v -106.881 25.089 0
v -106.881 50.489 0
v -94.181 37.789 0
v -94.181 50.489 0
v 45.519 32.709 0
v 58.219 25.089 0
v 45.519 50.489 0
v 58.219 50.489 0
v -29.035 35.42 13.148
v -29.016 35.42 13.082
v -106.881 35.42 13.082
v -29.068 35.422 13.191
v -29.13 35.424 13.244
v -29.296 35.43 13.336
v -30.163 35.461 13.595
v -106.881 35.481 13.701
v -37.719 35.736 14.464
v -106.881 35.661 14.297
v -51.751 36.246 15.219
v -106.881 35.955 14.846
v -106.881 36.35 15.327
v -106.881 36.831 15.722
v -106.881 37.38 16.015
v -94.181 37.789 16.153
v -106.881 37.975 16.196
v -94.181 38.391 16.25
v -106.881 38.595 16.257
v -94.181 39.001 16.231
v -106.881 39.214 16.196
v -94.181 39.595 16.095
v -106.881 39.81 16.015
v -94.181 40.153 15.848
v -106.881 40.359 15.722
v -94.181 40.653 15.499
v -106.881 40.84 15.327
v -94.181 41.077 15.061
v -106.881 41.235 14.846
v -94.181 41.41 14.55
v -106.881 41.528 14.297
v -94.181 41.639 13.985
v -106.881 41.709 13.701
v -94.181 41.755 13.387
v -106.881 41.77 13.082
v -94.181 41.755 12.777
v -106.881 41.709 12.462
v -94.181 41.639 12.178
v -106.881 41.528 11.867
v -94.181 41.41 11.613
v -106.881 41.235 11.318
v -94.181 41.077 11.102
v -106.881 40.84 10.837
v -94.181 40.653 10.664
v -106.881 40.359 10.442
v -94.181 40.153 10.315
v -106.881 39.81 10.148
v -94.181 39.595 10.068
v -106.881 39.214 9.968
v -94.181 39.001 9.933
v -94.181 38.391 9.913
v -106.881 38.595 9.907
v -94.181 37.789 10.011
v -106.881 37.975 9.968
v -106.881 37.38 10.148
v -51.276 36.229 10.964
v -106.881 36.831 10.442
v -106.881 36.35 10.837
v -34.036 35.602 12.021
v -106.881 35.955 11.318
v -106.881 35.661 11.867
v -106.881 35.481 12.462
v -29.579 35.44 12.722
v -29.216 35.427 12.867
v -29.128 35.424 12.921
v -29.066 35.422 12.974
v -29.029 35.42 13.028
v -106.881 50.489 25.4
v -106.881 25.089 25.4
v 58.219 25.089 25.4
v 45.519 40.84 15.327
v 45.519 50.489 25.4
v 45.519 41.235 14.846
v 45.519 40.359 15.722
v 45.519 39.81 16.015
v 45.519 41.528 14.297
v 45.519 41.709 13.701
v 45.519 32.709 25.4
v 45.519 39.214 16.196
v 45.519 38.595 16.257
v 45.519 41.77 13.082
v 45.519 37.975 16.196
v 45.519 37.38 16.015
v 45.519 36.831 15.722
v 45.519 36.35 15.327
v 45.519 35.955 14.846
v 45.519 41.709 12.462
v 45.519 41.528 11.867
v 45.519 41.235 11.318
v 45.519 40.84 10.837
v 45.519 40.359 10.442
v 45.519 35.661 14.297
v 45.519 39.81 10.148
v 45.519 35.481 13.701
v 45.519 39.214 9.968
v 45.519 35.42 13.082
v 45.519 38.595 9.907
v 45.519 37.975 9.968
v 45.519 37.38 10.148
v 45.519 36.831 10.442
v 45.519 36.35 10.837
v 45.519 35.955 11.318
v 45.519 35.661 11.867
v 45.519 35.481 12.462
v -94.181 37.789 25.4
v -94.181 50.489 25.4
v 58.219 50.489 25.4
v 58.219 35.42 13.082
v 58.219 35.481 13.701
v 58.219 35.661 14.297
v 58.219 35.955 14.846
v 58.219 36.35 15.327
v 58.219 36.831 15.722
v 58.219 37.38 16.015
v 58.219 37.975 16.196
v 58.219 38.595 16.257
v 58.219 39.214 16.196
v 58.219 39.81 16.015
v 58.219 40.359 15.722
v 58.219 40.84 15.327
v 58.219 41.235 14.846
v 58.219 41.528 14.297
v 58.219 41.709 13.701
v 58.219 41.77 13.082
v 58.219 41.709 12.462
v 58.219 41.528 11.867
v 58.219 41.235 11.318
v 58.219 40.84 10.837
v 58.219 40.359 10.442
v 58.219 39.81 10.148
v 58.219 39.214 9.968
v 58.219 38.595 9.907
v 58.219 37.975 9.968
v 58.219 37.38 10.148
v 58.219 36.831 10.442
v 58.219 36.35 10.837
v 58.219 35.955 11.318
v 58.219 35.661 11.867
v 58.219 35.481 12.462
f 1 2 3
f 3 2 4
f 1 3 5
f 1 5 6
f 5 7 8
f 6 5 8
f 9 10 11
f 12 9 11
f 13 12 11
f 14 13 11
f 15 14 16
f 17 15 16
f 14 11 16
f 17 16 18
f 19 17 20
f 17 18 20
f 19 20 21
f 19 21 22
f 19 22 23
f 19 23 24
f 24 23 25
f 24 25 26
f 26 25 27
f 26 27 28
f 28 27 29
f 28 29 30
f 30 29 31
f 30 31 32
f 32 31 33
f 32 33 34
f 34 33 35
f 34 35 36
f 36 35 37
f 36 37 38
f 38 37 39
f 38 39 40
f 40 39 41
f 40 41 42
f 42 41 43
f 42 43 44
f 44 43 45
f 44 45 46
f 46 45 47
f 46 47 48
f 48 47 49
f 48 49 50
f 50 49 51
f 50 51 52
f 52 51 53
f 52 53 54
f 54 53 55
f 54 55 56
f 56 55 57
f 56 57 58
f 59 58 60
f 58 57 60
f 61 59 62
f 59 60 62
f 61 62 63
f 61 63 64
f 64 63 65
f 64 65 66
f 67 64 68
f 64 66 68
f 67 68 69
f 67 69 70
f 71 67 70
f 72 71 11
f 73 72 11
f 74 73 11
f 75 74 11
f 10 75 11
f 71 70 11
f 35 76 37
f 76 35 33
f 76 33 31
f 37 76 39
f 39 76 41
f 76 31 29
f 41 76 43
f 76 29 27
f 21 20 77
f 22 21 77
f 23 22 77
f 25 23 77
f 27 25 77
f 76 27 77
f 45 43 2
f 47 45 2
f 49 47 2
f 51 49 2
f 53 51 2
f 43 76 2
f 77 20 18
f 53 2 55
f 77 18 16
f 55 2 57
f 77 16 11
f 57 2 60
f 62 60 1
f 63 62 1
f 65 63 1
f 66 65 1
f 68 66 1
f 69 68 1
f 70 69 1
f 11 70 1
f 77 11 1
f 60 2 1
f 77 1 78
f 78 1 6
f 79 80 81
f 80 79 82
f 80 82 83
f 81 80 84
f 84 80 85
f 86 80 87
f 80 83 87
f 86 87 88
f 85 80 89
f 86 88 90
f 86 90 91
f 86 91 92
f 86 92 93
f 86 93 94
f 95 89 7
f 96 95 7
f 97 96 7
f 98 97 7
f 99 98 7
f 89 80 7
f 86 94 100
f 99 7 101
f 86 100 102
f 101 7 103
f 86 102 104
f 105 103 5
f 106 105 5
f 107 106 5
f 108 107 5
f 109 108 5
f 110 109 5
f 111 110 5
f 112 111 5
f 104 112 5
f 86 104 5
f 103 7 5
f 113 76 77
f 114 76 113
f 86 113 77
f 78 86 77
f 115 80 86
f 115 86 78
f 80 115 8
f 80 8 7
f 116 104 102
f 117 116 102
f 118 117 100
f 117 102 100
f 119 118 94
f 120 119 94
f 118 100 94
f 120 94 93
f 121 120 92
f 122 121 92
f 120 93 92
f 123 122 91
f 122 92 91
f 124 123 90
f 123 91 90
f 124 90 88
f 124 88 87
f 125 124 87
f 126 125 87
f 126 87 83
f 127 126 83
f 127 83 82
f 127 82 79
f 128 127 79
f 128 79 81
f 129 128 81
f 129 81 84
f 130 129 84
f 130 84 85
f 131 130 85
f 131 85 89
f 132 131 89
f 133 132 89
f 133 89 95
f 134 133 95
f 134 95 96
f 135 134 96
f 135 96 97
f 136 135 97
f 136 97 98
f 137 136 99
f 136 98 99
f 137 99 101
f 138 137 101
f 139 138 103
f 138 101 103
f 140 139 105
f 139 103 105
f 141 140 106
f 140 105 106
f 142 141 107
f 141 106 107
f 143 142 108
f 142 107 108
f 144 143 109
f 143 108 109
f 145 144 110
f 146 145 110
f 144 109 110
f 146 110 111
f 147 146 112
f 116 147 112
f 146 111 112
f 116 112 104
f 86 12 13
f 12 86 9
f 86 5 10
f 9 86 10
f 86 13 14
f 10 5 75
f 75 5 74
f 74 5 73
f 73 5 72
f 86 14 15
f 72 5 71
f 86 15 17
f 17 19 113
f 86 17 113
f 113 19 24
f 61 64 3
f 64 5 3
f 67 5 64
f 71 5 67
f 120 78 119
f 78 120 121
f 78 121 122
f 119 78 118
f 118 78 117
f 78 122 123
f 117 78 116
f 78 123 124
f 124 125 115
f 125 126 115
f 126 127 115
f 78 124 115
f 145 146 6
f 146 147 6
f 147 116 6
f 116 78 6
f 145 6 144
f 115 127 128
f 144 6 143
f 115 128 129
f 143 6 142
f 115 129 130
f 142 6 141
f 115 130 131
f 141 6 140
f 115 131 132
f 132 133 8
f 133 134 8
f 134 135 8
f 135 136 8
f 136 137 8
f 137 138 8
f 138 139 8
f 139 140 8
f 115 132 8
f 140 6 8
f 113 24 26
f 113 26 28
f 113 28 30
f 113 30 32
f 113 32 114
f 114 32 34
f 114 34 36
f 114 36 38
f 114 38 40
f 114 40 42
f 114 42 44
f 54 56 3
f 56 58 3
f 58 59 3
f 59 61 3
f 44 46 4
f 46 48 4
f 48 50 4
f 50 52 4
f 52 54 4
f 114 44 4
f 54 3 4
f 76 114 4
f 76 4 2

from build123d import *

# Parameters (mm, degrees)
F1_DEPTH = 25.4
F3_D     = 6.35


with BuildPart() as f1:
    # F0 (on Top) → F1 (new body)
    with BuildSketch(Plane.XY):
        Polygon((-94.18092, 50.48936), (-106.88092, 50.48936), (-106.88092, 25.08936), (58.21908, 25.08936), (58.21908, 50.48936), (45.51908, 50.48936), (45.51908, 32.70936), (-94.18092, 37.78936), align=None)
    extrude(amount=F1_DEPTH)

    # F3 (through all)
    with Locations(Plane.YZ.offset(58.21908)):
        with Locations((38.594734, 13.081748)):
            Hole(F3_D / 2)


solid = f1.part
